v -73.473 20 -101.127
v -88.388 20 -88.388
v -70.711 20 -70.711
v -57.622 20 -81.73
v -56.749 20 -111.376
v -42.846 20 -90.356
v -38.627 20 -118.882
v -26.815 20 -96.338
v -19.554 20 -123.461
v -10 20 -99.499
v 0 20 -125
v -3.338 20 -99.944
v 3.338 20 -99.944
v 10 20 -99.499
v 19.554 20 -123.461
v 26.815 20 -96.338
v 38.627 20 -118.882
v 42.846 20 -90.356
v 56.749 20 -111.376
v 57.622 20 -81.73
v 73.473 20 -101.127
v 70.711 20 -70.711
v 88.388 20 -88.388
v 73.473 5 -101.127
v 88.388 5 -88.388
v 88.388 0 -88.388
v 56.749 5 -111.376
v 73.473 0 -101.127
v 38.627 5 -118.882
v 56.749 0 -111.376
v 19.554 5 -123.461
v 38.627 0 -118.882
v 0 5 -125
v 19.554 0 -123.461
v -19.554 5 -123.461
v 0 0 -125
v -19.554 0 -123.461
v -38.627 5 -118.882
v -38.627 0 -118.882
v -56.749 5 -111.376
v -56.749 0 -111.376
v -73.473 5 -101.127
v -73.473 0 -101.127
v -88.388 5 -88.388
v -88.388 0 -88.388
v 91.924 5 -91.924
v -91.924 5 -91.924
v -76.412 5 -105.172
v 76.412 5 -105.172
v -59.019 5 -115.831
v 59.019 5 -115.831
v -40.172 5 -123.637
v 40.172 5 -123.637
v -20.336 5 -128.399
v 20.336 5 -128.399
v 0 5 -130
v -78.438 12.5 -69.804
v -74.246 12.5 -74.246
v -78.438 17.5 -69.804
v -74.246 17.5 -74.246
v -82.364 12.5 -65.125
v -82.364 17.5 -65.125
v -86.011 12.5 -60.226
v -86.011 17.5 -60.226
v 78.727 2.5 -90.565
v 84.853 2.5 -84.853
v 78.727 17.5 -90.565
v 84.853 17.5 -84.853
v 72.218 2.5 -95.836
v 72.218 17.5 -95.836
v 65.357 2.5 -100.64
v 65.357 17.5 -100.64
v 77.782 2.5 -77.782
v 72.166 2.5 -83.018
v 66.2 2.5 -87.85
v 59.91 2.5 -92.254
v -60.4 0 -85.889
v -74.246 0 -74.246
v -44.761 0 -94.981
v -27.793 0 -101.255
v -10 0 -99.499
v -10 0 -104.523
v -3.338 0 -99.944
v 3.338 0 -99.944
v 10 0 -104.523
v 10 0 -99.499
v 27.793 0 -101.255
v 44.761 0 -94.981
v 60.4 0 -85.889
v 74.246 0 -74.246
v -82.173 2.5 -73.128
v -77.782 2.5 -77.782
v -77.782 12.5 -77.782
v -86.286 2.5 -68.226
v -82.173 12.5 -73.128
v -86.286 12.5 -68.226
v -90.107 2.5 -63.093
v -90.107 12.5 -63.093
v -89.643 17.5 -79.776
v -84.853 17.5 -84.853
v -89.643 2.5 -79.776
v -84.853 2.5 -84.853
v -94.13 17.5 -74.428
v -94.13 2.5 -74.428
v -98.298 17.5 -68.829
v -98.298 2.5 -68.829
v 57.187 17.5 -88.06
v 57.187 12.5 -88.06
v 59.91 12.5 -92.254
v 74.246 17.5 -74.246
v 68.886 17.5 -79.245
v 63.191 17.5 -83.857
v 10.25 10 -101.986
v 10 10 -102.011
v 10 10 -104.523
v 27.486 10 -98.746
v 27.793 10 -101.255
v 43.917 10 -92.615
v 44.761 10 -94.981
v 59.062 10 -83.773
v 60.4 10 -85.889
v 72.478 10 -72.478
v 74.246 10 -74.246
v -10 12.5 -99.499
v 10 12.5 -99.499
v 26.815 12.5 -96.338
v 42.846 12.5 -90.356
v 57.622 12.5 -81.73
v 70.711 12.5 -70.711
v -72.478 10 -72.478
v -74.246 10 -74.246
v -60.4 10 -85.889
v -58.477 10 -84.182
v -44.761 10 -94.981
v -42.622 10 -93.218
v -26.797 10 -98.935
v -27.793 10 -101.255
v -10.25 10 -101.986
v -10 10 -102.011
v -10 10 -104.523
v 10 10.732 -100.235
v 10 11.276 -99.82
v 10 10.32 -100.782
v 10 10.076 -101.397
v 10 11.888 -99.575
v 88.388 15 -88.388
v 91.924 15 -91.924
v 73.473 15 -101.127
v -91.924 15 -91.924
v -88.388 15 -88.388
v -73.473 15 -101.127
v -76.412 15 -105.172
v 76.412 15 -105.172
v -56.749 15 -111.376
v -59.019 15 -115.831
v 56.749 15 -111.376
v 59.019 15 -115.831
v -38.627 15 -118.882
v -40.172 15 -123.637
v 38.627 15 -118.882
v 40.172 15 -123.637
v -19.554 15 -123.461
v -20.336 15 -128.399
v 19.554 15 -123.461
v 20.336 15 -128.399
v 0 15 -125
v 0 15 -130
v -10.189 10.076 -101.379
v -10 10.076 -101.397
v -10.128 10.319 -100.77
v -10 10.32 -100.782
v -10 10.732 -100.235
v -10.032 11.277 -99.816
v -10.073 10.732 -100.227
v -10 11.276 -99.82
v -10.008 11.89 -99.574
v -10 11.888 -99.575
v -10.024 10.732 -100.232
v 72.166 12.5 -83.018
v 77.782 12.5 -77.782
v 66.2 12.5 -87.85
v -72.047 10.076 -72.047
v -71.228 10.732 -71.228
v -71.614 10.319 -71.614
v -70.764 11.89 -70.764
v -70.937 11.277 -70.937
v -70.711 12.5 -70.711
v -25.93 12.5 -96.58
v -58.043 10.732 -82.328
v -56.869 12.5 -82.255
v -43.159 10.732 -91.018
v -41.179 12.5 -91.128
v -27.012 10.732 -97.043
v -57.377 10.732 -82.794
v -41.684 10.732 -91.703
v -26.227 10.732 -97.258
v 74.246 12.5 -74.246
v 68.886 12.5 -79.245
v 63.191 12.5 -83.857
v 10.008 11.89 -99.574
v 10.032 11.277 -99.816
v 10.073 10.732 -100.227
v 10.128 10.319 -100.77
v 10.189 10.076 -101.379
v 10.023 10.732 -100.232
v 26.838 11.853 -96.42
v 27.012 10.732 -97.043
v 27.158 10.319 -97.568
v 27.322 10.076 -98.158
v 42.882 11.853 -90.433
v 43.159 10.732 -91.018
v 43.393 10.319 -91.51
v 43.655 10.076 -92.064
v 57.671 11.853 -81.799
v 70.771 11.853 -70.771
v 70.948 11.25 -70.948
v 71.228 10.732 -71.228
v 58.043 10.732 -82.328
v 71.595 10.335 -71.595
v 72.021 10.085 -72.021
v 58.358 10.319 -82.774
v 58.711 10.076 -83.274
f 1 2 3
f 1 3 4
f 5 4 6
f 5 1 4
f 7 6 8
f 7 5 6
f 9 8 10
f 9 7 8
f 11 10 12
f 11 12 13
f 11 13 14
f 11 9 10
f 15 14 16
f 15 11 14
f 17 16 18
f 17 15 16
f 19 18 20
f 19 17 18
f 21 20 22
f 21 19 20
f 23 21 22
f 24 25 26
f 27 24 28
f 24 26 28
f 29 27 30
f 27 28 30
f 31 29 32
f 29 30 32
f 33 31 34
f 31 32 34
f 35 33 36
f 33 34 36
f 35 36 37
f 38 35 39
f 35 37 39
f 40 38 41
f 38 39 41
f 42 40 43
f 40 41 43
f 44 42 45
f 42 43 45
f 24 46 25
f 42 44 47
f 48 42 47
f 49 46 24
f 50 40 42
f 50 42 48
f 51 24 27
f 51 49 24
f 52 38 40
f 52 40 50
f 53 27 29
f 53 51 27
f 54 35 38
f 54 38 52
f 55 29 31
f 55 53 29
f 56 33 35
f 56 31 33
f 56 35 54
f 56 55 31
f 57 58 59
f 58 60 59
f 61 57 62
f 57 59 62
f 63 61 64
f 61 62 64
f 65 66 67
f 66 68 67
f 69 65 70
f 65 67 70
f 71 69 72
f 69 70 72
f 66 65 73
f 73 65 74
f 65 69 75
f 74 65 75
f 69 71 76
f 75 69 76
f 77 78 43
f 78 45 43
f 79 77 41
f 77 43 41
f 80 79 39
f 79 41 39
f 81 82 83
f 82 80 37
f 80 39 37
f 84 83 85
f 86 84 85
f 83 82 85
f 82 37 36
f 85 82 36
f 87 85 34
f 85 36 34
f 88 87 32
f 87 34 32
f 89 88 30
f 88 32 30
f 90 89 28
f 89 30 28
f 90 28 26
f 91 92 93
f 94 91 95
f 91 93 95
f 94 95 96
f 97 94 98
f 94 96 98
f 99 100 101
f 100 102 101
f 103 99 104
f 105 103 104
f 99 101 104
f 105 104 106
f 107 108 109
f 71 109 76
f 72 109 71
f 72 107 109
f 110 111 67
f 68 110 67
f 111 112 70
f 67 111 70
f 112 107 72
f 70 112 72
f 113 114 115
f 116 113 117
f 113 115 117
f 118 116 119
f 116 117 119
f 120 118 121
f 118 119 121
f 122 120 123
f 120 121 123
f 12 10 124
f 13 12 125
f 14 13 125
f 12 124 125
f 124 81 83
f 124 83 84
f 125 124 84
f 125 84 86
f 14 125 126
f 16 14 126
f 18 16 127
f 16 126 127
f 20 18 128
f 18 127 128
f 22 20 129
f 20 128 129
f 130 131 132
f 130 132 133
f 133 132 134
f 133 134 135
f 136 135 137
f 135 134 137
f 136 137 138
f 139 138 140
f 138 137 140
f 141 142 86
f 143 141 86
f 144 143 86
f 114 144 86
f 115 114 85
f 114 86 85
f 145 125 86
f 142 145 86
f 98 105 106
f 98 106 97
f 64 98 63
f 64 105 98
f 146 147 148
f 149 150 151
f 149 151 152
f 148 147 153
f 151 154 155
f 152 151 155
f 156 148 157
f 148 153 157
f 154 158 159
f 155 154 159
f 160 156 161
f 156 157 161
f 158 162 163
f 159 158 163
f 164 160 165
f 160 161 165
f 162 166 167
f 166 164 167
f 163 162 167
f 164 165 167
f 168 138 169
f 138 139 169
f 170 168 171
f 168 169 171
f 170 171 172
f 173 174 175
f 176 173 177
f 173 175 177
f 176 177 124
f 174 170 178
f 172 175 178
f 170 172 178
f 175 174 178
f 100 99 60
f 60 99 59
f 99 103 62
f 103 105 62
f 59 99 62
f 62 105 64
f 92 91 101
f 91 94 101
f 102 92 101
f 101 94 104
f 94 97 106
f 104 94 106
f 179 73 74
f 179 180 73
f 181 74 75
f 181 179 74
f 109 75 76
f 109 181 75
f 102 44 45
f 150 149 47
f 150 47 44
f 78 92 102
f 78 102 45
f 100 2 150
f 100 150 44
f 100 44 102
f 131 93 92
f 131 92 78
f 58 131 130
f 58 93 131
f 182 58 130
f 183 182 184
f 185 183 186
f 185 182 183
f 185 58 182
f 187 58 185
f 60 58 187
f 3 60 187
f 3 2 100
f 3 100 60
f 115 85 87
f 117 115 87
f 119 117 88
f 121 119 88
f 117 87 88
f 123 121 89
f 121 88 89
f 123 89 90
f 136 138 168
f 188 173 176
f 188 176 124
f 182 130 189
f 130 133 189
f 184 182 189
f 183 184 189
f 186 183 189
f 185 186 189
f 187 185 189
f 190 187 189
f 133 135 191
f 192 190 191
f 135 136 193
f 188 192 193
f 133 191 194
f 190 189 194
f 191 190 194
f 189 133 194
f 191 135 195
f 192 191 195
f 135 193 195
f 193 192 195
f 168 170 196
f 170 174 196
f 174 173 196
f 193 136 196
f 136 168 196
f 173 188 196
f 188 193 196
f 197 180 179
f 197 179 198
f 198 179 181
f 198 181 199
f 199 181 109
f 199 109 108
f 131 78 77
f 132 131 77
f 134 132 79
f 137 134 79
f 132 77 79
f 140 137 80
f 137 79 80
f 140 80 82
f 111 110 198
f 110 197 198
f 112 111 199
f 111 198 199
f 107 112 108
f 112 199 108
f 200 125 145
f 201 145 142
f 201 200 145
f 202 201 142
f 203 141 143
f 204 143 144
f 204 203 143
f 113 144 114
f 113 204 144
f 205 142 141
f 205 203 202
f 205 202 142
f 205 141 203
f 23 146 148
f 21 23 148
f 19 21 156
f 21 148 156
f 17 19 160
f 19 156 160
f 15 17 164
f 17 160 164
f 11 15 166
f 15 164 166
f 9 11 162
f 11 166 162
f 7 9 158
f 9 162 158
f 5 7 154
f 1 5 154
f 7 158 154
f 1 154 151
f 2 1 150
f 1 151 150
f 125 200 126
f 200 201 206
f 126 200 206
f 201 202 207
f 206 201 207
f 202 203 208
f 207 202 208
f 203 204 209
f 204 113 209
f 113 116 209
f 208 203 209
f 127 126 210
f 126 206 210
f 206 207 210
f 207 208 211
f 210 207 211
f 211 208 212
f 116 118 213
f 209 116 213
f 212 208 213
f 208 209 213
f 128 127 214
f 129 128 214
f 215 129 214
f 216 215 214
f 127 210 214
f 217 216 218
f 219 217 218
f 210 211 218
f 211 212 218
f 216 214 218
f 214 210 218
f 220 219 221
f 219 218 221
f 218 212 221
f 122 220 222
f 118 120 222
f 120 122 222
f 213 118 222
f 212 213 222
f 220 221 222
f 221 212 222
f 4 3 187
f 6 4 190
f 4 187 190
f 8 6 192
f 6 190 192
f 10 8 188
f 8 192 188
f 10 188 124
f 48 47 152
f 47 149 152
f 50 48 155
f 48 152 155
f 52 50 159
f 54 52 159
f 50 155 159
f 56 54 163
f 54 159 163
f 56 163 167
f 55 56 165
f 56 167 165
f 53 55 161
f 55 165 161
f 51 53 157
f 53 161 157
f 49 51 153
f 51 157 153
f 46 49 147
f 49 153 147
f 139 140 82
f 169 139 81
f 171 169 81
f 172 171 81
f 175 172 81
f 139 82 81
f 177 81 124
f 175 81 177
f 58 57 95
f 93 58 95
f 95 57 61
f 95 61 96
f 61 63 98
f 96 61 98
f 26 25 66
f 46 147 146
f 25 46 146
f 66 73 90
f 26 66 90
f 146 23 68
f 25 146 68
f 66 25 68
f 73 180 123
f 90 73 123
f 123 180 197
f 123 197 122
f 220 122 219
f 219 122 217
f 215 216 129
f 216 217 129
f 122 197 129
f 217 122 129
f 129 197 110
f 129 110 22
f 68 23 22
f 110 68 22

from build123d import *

# Parameters (mm, degrees)
BOSS_EXTRUDE1_DEPTH = 10
BOSS_EXTRUDE2_DEPTH = 10
SKETCH3_W           = 10
SKETCH3_H           = 10
REVOLVE1_ANGLE      = 10
SKETCH4_W           = 10
SKETCH4_H           = 10
CUT_REVOLVE1_ANGLE  = 12
SKETCH5_W           = 10
SKETCH5_H           = 10
REVOLVE2_ANGLE      = 90
FILLET1_R           = 2.5


with BuildPart() as part:
    # Sketch1 → Boss-Extrude1 (new body)
    with BuildSketch(Plane(origin=(0, 0, 0), x_dir=(1, 0, 0), z_dir=(0, 1, 0))):
        with BuildLine():
            ThreePointArc((10, 104.522724802), (44.760729067, 94.981456787), (74.246212025, 74.246212025))
            Line((74.246212025, 74.246212025), (88.388347648, 88.388347648))
            ThreePointArc((88.388347648, 88.388347648), (0, 125), (-88.388347648, 88.388347648))
            Line((-88.388347648, 88.388347648), (-74.246212025, 74.246212025))
            ThreePointArc((-74.246212025, 74.246212025), (-44.760729067, 94.981456787), (-10, 104.522724802))
            Line((-10, 104.522724802), (-10, 105))
            Line((-10, 105), (7e-08, 105))
            Line((7e-08, 105), (10, 105))
            Line((10, 105), (10, 104.522724802))
        make_face()
        with BuildLine():
            ThreePointArc((-10, 99.498743711), (0, 100), (10, 99.498743711))
            Line((10, 99.498743711), (10, 104.522724802))
            ThreePointArc((10, 104.522724802), (5.005691586, 104.880613327), (7e-08, 105))
            ThreePointArc((7e-08, 105), (-5.005691516, 104.88061333), (-10, 104.522724802))
            Line((-10, 104.522724802), (-10, 99.498743711))
        make_face()
        with BuildLine():
            ThreePointArc((7e-08, 105), (5.005691586, 104.880613327), (10, 104.522724802))
            Line((10, 104.522724802), (10, 105))
            Line((10, 105), (7e-08, 105))
        make_face()
        with BuildLine():
            Line((-10, 105), (-10, 104.522724802))
            ThreePointArc((-10, 104.522724802), (-5.005691516, 104.88061333), (7e-08, 105))
            Line((7e-08, 105), (-10, 105))
        make_face()
    extrude(amount=BOSS_EXTRUDE1_DEPTH)

    # Sketch2 → Boss-Extrude2 (add)
    with BuildSketch(Plane(origin=(0, 10, 0), x_dir=(1, 0, 0), z_dir=(0, 1, 0))):
        with BuildLine():
            Line((-88.388347648, 88.388347648), (-74.246212025, 74.246212025))
            ThreePointArc((-74.246212025, 74.246212025), (-44.760729067, 94.981456787), (-10, 104.522724802))
            Line((-10, 104.522724802), (-10, 99.498743711))
            ThreePointArc((-10, 99.498743711), (0, 100), (10, 99.498743711))
            Line((10, 99.498743711), (10, 104.522724802))
            ThreePointArc((10, 104.522724802), (44.760729067, 94.981456787), (74.246212025, 74.246212025))
            Line((74.246212025, 74.246212025), (88.388347648, 88.388347648))
            ThreePointArc((88.388347648, 88.388347648), (0, 125), (-88.388347648, 88.388347648))
        make_face()
        with BuildLine():
            ThreePointArc((-10, 104.522724802), (-44.760729067, 94.981456787), (-74.246212025, 74.246212025))
            Line((-74.246212025, 74.246212025), (-70.710678119, 70.710678119))
            ThreePointArc((-70.710678119, 70.710678119), (-42.845554854, 90.356286053), (-10, 99.498743711))
            Line((-10, 99.498743711), (-10, 104.522724802))
        make_face()
        with BuildLine():
            Line((70.710678119, 70.710678119), (74.246212025, 74.246212025))
            ThreePointArc((74.246212025, 74.246212025), (44.760729067, 94.981456787), (10, 104.522724802))
            Line((10, 104.522724802), (10, 99.498743711))
            ThreePointArc((10, 99.498743711), (42.845554854, 90.356286053), (70.710678119, 70.710678119))
        make_face()
    extrude(amount=BOSS_EXTRUDE2_DEPTH)

    # Sketch3 → Revolve1 (revolve)
    with BuildSketch(Plane(origin=(0, 0, 0), x_dir=(0.7071067811865512, 0, 0.7071067811865438), z_dir=(-0.7071067811865438, 0, 0.7071067811865512))):
        Polygon((-120, 17.5), (-120, 12.5), (-110, 12.5), (-105, 12.5), (-105, 17.5), align=None)
        with Locations((-115, 7.5)):
            Rectangle(SKETCH3_W, SKETCH3_H)
    revolve(axis=Axis((0, 0, 0), (0, 1, 0)), revolution_arc=REVOLVE1_ANGLE)

    # Sketch4 → Cut-Revolve1 (revolve, cut)
    with BuildSketch(Plane(origin=(0, 0, 0), x_dir=(0.7071067811865507, 0, -0.7071067811865445), z_dir=(0.7071067811865445, 0, 0.7071067811865507))):
        Polygon((105, 12.5), (110, 12.5), (120, 12.5), (120, 17.5), (105, 17.5), align=None)
        with Locations((115, 7.5)):
            Rectangle(SKETCH4_W, SKETCH4_H)
    revolve(axis=Axis((0, 0, 0), (0, 1, 0)), revolution_arc=CUT_REVOLVE1_ANGLE, mode=Mode.SUBTRACT)

    # Sketch5 → Revolve2 (revolve)
    with BuildSketch(Plane(origin=(0, 0, 0), x_dir=(0.7071067811865512, 0, 0.7071067811865438), z_dir=(-0.7071067811865438, 0, 0.7071067811865512))):
        with Locations((-125, 10)):
            Rectangle(SKETCH5_W, SKETCH5_H)
    revolve(axis=Axis((0, 0, 0), (0, -1, 0)), revolution_arc=REVOLVE2_ANGLE)

    # Fillet1
    fillet1_edges = [part.edges().sort_by_distance(p)[0] for p in [
        (-42.845554854, 10, -90.356286053),
        (42.845554854, 10, -90.356286053),
    ]]
    fillet(fillet1_edges, radius=FILLET1_R)


solid = part.part
